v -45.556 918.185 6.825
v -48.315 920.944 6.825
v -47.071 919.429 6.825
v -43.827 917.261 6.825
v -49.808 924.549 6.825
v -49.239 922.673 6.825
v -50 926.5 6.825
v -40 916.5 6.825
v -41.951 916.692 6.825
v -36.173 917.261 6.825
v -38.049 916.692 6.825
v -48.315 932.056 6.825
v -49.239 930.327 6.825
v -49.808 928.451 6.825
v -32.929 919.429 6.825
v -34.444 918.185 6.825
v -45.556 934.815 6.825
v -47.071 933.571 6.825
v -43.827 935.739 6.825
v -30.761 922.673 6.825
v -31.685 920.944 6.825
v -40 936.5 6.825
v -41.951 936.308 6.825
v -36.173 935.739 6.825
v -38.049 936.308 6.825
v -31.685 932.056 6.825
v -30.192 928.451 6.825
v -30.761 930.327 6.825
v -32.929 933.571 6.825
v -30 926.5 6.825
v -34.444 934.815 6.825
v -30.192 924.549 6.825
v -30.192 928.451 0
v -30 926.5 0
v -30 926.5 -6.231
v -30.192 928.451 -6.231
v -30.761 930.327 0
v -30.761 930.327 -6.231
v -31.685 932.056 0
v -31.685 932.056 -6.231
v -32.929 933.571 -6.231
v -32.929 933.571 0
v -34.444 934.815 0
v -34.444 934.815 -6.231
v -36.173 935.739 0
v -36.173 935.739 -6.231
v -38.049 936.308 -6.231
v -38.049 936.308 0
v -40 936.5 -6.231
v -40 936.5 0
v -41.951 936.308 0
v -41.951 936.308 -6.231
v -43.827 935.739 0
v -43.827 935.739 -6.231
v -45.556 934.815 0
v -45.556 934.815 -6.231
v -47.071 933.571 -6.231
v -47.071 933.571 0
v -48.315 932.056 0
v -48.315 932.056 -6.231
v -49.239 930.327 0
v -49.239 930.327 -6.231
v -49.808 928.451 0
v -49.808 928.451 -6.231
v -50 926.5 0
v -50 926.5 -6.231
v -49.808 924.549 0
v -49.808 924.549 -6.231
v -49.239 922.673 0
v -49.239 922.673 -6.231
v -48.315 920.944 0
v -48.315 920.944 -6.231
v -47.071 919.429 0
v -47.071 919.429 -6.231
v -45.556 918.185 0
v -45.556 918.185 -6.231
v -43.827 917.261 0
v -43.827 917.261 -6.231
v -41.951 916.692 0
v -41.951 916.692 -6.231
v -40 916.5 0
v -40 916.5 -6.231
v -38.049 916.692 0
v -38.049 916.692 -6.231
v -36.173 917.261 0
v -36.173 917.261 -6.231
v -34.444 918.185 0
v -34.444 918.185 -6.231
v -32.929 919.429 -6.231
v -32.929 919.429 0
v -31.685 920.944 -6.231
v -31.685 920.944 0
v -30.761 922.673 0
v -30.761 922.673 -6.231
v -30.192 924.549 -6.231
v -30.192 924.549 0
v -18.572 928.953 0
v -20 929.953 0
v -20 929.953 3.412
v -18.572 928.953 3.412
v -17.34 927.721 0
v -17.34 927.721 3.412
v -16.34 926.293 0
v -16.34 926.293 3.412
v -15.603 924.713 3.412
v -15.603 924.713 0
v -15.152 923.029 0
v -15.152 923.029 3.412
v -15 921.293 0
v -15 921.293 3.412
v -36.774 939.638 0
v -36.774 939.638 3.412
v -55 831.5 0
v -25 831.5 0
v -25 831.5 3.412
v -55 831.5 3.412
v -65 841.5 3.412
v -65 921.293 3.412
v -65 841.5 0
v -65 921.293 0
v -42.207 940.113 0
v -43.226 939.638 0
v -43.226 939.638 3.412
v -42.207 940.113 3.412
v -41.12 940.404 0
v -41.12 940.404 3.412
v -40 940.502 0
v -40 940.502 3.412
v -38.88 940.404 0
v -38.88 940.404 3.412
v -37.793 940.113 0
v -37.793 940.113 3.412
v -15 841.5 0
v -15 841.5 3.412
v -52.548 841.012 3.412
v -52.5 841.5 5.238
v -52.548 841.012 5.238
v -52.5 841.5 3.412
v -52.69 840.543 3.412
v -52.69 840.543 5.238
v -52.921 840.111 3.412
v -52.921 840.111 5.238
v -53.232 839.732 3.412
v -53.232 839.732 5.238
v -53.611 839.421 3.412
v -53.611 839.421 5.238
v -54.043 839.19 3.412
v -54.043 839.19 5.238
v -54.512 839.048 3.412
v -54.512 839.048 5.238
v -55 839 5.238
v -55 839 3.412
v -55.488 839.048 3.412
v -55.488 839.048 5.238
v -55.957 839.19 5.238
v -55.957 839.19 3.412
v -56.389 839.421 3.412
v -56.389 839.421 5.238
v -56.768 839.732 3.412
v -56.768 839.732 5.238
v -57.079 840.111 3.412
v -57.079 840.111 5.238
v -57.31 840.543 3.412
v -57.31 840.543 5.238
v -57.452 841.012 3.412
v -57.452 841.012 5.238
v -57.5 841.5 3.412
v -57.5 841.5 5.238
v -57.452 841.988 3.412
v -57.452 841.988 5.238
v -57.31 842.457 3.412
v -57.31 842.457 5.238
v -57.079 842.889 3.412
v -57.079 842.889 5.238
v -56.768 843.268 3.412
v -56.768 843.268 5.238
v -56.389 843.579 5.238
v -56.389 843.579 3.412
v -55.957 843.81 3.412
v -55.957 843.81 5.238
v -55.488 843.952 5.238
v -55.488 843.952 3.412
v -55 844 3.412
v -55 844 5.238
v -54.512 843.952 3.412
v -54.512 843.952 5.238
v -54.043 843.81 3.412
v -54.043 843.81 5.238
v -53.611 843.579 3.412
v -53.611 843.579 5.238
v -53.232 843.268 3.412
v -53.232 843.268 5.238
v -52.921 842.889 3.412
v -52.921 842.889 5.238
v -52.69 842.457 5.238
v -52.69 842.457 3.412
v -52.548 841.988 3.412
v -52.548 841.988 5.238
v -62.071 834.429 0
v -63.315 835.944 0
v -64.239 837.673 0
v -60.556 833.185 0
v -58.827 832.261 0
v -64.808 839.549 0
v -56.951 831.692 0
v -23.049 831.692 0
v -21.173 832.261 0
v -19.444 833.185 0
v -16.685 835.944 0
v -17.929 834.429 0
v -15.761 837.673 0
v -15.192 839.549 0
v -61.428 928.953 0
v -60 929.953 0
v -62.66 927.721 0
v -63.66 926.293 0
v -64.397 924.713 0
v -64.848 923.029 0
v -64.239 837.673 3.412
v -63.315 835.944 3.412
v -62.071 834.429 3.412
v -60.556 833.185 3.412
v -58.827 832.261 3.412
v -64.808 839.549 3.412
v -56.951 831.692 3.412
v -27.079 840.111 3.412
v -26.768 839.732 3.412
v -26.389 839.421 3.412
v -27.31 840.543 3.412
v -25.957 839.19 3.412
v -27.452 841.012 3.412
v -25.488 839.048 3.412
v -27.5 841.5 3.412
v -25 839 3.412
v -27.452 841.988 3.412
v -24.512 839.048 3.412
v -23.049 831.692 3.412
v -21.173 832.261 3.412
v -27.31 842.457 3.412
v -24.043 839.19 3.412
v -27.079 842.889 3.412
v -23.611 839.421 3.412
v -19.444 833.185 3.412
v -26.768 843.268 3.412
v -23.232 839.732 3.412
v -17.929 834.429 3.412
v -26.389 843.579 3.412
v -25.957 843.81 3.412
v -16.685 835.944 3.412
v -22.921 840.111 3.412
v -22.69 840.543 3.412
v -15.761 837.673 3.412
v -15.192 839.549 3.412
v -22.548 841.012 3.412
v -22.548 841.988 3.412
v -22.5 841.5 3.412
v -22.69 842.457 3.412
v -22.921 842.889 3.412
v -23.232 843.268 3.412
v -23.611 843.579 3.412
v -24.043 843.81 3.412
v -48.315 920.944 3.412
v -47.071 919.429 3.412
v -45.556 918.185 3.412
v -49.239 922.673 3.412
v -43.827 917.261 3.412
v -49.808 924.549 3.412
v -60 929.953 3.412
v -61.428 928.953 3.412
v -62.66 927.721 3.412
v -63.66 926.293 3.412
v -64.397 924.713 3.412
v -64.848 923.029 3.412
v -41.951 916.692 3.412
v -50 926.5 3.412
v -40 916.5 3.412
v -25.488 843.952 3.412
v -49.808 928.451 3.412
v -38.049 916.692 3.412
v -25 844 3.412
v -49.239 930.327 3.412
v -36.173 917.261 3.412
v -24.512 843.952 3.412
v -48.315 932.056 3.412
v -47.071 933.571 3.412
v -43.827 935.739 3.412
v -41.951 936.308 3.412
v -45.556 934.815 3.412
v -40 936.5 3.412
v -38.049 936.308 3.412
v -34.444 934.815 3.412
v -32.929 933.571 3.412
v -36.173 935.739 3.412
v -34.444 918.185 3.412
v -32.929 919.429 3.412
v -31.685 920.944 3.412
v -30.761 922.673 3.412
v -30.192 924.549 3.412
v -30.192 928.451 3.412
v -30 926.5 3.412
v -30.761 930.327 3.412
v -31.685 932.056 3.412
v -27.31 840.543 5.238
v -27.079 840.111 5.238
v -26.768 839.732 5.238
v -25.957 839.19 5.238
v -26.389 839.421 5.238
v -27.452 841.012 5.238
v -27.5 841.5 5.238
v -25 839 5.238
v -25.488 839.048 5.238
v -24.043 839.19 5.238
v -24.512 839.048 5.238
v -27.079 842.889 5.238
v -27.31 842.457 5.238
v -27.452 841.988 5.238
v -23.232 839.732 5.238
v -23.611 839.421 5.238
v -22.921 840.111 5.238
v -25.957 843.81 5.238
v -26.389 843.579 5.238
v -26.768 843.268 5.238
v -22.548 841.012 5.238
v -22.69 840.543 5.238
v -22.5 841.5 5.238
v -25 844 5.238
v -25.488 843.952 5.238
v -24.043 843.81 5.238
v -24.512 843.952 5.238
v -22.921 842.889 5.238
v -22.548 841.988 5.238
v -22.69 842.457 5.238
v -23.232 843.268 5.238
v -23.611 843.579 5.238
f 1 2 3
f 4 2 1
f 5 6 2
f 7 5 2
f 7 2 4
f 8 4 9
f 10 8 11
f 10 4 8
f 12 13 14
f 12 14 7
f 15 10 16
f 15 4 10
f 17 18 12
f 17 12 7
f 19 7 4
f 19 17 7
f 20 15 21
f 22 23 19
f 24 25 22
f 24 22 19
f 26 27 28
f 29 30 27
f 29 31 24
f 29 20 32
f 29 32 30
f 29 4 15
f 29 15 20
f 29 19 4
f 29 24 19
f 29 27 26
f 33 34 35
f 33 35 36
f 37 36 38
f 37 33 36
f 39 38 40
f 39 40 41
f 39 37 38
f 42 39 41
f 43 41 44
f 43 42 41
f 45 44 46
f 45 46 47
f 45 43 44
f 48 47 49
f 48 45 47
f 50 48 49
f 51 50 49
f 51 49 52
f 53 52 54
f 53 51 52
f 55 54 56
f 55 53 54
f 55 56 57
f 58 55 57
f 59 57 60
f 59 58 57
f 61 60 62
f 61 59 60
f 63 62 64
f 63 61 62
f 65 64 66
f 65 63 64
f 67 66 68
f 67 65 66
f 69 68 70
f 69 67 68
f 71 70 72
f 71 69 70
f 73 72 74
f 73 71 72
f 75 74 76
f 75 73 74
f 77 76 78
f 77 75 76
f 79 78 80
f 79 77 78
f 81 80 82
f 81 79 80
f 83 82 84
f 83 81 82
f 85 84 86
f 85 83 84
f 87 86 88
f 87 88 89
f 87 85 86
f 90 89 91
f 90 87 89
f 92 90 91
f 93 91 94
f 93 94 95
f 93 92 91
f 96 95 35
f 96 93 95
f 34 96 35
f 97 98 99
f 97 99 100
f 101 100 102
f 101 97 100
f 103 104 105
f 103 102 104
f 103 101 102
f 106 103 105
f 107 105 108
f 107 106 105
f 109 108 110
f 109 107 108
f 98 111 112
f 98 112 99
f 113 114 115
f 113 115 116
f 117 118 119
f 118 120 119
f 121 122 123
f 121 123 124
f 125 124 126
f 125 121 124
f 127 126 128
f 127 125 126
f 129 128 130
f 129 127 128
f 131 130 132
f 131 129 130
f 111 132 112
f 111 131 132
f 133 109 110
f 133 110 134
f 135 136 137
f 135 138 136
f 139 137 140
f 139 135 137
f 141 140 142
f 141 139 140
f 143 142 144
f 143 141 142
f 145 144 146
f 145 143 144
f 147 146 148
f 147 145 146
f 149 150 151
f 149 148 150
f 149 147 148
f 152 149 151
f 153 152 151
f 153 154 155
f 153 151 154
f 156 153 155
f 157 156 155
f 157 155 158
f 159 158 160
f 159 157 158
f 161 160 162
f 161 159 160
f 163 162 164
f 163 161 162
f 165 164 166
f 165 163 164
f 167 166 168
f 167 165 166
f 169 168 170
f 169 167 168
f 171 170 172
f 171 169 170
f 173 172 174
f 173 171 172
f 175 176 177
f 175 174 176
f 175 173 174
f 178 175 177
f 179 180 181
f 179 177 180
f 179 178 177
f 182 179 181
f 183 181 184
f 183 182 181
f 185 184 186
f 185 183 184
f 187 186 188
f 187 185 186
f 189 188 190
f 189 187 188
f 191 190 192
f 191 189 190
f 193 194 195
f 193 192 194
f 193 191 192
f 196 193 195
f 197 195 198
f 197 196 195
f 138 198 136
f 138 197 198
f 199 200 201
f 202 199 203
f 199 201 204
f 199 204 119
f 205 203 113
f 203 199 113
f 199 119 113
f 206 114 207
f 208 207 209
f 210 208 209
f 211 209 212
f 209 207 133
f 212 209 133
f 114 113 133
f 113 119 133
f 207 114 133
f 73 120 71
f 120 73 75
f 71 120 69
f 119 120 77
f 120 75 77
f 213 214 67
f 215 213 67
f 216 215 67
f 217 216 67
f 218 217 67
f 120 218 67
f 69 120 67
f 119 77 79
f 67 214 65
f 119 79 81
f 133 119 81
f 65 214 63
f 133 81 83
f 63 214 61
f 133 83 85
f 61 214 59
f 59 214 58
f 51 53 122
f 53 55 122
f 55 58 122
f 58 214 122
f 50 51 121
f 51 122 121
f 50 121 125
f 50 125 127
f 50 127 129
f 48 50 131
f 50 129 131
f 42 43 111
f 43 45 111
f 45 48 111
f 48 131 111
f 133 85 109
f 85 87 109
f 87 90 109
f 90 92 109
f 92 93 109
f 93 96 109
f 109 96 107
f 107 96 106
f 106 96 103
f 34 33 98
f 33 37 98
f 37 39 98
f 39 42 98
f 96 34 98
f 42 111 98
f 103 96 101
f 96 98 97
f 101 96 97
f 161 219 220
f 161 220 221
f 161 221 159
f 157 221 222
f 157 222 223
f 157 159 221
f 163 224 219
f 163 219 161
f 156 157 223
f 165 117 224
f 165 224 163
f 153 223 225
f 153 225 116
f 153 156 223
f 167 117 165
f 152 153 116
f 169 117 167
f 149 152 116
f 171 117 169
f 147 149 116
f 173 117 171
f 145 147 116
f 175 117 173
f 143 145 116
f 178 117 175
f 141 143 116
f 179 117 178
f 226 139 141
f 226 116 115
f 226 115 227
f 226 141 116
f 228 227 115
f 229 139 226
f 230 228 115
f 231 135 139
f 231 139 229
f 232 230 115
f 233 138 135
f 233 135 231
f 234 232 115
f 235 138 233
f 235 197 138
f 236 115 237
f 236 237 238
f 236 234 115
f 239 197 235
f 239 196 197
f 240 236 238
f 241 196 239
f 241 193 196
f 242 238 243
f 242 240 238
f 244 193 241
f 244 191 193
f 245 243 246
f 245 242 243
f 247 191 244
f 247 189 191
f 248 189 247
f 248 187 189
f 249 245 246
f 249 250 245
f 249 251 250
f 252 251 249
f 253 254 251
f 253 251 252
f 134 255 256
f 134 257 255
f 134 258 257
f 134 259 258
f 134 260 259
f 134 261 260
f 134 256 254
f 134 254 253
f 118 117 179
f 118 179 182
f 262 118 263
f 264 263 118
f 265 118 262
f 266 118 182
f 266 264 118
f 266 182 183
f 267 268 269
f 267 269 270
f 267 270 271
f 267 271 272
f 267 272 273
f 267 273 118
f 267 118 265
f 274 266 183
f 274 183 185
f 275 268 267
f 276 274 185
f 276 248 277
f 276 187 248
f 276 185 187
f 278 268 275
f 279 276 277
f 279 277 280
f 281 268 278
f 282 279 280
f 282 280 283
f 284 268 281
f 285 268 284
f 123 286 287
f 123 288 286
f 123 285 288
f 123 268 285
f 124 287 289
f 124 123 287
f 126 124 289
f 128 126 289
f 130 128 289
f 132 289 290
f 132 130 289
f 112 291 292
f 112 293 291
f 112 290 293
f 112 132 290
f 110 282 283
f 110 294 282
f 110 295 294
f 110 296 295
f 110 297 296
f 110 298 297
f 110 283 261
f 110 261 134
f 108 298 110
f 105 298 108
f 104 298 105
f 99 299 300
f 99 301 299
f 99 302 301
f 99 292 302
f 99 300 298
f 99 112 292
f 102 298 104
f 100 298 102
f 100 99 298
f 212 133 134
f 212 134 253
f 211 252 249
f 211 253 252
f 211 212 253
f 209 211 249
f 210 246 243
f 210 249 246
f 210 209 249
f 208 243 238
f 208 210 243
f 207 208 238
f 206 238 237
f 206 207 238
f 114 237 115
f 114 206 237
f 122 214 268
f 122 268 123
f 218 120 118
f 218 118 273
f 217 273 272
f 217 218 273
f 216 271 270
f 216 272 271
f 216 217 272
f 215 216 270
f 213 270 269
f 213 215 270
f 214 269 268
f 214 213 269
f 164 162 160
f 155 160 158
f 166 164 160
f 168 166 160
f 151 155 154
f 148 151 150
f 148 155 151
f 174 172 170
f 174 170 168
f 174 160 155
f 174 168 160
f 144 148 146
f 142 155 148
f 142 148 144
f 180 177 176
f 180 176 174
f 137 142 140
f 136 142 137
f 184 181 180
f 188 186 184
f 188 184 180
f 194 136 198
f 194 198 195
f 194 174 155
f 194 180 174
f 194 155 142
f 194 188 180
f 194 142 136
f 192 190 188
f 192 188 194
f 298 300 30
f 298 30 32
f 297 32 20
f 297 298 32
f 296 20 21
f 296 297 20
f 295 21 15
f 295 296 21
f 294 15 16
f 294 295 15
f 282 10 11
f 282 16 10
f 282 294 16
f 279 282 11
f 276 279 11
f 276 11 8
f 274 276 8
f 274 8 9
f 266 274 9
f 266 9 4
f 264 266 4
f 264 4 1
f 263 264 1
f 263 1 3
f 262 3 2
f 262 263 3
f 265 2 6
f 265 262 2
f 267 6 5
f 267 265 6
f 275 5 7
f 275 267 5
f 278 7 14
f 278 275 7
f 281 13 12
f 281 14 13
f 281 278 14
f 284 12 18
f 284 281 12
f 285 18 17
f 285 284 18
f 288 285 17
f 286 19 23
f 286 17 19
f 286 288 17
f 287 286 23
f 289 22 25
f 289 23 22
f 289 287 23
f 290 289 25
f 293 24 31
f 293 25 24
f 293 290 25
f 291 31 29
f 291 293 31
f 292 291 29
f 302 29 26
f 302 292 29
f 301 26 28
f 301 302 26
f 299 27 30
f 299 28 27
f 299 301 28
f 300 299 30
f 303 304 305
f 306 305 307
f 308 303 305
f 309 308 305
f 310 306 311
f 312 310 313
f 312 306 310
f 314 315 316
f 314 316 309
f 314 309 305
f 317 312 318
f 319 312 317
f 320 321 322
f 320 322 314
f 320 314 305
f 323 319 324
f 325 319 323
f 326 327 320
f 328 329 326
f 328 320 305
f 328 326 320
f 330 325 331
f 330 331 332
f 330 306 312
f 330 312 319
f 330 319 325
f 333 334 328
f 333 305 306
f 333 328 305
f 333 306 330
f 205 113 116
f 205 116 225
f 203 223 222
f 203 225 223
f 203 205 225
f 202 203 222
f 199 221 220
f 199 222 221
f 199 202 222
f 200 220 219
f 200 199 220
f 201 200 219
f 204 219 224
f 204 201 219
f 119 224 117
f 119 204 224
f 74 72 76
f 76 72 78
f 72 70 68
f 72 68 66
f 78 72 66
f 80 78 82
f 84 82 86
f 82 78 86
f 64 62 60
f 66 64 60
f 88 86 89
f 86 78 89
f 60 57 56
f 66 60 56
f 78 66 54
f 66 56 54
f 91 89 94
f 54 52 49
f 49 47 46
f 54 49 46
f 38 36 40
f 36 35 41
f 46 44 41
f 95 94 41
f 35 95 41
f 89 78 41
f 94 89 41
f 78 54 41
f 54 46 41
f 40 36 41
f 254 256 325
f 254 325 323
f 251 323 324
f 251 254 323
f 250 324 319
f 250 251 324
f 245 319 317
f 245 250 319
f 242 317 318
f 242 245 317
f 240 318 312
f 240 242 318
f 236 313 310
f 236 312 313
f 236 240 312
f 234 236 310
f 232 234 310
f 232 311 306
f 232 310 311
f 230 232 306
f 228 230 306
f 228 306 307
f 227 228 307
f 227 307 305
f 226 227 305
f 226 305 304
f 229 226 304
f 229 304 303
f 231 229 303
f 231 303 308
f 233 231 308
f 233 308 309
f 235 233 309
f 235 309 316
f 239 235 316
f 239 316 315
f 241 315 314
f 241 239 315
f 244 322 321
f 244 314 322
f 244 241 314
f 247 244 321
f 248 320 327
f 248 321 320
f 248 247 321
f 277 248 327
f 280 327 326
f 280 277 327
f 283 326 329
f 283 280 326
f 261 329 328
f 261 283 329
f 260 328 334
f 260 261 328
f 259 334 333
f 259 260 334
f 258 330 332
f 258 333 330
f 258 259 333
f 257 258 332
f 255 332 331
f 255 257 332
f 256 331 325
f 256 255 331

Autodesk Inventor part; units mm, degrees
ref_plane "YZ Plane" through (0, 0, 0) normal (1, 0, 0) x (0, 1, 0)
ref_plane "XZ Plane" through (0, 0, 0) normal (0, 1, 0) x (-1, 0, 0)
ref_plane "XY Plane" through (0, 0, 0) normal (0, 0, 1) x (1, 0, 0)
sketch "Sketch1" plane through (0, 0, 0) normal (0, 0, 1) x (1, 0, 0)
  circle A0 centre (-40, 926.5) radius 10 projected
  circle A1 centre (-40, 926.5) radius 14 projected
  line L0 (-65, 921.2927) -> (-65, 841.5)
  line L1 (-55, 831.5) -> (-40, 831.5)
  arc A2 (-60, 929.953) -> (-65, 921.2927) centre (-55, 921.2927) ccw
  arc A3 (-65, 841.5) -> (-55, 831.5) centre (-55, 841.5) ccw
  line L2 (-40, 926.5) -> (-40, 831.5) construction
  line L3 (-40, 936.5) -> (-40, 831.5) construction
  circle A4 centre (-40, 926.5) radius 10
  line L4 (-15, 921.2927) -> (-15, 841.5)
  line L5 (-25, 831.5) -> (-40, 831.5)
  arc A5 (-15, 921.2927) -> (-20, 929.953) centre (-25, 921.2927) ccw
  arc A6 (-25, 831.5) -> (-15, 841.5) centre (-25, 841.5) ccw
  line L6 (-60, 929.953) -> (-43.2258, 939.6376)
  line L7 (-36.7742, 939.6376) -> (-20, 929.953)
  arc A7 (-36.7742, 939.6376) -> (-43.2258, 939.6376) centre (-40, 934.0503) ccw
  point P0 (0, 0)
  point P1 (-40, 941.5)
  dimension "d0" = 10
  dimension "d1" = 25
  dimension "d3" = 95
  dimension "d4" = 15
  dimension "d5" = 6.4516
  dimension "d6" = 120
  dimension "d7" = 4.3301
extrude "Extrusion1" add sketch "Sketch1" along normal blind 3.4125 contours A0 | A1 L6 A7 L7 | A1 L7 A5 L4 A6 L5 L1 A3 L0 A2 L6
sketch "Sketch2" plane through (0, 0, 3.4125) normal (0, 0, 1) x (1, 0, 0)
  circle A0 centre (-40, 926.5) radius 10 projected
  circle A1 centre (-40, 926.5) radius 10
  point P0 (0, 0)
extrude "Extrusion2" add sketch "Sketch2" along normal blind 3.4125 and the other way blind 9.6435
sketch "Sketch3" plane through (-40, 926.5, 6.825) normal (0, 0, 1) x (1, 0, 0)
  circle A0 centre (0, 0) radius 10 projected
  point P0 (40, -926.5)
sketch "Sketch4" plane through (0, 0, 3.4125) normal (0, 0, 1) x (1, 0, 0)
  arc A0 (-65, 841.5) -> (-55, 831.5) centre (-55, 841.5) ccw projected
  arc A1 (-25, 831.5) -> (-15, 841.5) centre (-25, 841.5) ccw projected
  circle A2 centre (-55, 841.5) radius 2.5
  circle A3 centre (-25, 841.5) radius 2.5
  point P0 (0, 0)
  dimension "d14" = 5
extrude "Extrusion3" add sketch "Sketch4" along normal blind 1.825
properties part number "WheelHolder"
